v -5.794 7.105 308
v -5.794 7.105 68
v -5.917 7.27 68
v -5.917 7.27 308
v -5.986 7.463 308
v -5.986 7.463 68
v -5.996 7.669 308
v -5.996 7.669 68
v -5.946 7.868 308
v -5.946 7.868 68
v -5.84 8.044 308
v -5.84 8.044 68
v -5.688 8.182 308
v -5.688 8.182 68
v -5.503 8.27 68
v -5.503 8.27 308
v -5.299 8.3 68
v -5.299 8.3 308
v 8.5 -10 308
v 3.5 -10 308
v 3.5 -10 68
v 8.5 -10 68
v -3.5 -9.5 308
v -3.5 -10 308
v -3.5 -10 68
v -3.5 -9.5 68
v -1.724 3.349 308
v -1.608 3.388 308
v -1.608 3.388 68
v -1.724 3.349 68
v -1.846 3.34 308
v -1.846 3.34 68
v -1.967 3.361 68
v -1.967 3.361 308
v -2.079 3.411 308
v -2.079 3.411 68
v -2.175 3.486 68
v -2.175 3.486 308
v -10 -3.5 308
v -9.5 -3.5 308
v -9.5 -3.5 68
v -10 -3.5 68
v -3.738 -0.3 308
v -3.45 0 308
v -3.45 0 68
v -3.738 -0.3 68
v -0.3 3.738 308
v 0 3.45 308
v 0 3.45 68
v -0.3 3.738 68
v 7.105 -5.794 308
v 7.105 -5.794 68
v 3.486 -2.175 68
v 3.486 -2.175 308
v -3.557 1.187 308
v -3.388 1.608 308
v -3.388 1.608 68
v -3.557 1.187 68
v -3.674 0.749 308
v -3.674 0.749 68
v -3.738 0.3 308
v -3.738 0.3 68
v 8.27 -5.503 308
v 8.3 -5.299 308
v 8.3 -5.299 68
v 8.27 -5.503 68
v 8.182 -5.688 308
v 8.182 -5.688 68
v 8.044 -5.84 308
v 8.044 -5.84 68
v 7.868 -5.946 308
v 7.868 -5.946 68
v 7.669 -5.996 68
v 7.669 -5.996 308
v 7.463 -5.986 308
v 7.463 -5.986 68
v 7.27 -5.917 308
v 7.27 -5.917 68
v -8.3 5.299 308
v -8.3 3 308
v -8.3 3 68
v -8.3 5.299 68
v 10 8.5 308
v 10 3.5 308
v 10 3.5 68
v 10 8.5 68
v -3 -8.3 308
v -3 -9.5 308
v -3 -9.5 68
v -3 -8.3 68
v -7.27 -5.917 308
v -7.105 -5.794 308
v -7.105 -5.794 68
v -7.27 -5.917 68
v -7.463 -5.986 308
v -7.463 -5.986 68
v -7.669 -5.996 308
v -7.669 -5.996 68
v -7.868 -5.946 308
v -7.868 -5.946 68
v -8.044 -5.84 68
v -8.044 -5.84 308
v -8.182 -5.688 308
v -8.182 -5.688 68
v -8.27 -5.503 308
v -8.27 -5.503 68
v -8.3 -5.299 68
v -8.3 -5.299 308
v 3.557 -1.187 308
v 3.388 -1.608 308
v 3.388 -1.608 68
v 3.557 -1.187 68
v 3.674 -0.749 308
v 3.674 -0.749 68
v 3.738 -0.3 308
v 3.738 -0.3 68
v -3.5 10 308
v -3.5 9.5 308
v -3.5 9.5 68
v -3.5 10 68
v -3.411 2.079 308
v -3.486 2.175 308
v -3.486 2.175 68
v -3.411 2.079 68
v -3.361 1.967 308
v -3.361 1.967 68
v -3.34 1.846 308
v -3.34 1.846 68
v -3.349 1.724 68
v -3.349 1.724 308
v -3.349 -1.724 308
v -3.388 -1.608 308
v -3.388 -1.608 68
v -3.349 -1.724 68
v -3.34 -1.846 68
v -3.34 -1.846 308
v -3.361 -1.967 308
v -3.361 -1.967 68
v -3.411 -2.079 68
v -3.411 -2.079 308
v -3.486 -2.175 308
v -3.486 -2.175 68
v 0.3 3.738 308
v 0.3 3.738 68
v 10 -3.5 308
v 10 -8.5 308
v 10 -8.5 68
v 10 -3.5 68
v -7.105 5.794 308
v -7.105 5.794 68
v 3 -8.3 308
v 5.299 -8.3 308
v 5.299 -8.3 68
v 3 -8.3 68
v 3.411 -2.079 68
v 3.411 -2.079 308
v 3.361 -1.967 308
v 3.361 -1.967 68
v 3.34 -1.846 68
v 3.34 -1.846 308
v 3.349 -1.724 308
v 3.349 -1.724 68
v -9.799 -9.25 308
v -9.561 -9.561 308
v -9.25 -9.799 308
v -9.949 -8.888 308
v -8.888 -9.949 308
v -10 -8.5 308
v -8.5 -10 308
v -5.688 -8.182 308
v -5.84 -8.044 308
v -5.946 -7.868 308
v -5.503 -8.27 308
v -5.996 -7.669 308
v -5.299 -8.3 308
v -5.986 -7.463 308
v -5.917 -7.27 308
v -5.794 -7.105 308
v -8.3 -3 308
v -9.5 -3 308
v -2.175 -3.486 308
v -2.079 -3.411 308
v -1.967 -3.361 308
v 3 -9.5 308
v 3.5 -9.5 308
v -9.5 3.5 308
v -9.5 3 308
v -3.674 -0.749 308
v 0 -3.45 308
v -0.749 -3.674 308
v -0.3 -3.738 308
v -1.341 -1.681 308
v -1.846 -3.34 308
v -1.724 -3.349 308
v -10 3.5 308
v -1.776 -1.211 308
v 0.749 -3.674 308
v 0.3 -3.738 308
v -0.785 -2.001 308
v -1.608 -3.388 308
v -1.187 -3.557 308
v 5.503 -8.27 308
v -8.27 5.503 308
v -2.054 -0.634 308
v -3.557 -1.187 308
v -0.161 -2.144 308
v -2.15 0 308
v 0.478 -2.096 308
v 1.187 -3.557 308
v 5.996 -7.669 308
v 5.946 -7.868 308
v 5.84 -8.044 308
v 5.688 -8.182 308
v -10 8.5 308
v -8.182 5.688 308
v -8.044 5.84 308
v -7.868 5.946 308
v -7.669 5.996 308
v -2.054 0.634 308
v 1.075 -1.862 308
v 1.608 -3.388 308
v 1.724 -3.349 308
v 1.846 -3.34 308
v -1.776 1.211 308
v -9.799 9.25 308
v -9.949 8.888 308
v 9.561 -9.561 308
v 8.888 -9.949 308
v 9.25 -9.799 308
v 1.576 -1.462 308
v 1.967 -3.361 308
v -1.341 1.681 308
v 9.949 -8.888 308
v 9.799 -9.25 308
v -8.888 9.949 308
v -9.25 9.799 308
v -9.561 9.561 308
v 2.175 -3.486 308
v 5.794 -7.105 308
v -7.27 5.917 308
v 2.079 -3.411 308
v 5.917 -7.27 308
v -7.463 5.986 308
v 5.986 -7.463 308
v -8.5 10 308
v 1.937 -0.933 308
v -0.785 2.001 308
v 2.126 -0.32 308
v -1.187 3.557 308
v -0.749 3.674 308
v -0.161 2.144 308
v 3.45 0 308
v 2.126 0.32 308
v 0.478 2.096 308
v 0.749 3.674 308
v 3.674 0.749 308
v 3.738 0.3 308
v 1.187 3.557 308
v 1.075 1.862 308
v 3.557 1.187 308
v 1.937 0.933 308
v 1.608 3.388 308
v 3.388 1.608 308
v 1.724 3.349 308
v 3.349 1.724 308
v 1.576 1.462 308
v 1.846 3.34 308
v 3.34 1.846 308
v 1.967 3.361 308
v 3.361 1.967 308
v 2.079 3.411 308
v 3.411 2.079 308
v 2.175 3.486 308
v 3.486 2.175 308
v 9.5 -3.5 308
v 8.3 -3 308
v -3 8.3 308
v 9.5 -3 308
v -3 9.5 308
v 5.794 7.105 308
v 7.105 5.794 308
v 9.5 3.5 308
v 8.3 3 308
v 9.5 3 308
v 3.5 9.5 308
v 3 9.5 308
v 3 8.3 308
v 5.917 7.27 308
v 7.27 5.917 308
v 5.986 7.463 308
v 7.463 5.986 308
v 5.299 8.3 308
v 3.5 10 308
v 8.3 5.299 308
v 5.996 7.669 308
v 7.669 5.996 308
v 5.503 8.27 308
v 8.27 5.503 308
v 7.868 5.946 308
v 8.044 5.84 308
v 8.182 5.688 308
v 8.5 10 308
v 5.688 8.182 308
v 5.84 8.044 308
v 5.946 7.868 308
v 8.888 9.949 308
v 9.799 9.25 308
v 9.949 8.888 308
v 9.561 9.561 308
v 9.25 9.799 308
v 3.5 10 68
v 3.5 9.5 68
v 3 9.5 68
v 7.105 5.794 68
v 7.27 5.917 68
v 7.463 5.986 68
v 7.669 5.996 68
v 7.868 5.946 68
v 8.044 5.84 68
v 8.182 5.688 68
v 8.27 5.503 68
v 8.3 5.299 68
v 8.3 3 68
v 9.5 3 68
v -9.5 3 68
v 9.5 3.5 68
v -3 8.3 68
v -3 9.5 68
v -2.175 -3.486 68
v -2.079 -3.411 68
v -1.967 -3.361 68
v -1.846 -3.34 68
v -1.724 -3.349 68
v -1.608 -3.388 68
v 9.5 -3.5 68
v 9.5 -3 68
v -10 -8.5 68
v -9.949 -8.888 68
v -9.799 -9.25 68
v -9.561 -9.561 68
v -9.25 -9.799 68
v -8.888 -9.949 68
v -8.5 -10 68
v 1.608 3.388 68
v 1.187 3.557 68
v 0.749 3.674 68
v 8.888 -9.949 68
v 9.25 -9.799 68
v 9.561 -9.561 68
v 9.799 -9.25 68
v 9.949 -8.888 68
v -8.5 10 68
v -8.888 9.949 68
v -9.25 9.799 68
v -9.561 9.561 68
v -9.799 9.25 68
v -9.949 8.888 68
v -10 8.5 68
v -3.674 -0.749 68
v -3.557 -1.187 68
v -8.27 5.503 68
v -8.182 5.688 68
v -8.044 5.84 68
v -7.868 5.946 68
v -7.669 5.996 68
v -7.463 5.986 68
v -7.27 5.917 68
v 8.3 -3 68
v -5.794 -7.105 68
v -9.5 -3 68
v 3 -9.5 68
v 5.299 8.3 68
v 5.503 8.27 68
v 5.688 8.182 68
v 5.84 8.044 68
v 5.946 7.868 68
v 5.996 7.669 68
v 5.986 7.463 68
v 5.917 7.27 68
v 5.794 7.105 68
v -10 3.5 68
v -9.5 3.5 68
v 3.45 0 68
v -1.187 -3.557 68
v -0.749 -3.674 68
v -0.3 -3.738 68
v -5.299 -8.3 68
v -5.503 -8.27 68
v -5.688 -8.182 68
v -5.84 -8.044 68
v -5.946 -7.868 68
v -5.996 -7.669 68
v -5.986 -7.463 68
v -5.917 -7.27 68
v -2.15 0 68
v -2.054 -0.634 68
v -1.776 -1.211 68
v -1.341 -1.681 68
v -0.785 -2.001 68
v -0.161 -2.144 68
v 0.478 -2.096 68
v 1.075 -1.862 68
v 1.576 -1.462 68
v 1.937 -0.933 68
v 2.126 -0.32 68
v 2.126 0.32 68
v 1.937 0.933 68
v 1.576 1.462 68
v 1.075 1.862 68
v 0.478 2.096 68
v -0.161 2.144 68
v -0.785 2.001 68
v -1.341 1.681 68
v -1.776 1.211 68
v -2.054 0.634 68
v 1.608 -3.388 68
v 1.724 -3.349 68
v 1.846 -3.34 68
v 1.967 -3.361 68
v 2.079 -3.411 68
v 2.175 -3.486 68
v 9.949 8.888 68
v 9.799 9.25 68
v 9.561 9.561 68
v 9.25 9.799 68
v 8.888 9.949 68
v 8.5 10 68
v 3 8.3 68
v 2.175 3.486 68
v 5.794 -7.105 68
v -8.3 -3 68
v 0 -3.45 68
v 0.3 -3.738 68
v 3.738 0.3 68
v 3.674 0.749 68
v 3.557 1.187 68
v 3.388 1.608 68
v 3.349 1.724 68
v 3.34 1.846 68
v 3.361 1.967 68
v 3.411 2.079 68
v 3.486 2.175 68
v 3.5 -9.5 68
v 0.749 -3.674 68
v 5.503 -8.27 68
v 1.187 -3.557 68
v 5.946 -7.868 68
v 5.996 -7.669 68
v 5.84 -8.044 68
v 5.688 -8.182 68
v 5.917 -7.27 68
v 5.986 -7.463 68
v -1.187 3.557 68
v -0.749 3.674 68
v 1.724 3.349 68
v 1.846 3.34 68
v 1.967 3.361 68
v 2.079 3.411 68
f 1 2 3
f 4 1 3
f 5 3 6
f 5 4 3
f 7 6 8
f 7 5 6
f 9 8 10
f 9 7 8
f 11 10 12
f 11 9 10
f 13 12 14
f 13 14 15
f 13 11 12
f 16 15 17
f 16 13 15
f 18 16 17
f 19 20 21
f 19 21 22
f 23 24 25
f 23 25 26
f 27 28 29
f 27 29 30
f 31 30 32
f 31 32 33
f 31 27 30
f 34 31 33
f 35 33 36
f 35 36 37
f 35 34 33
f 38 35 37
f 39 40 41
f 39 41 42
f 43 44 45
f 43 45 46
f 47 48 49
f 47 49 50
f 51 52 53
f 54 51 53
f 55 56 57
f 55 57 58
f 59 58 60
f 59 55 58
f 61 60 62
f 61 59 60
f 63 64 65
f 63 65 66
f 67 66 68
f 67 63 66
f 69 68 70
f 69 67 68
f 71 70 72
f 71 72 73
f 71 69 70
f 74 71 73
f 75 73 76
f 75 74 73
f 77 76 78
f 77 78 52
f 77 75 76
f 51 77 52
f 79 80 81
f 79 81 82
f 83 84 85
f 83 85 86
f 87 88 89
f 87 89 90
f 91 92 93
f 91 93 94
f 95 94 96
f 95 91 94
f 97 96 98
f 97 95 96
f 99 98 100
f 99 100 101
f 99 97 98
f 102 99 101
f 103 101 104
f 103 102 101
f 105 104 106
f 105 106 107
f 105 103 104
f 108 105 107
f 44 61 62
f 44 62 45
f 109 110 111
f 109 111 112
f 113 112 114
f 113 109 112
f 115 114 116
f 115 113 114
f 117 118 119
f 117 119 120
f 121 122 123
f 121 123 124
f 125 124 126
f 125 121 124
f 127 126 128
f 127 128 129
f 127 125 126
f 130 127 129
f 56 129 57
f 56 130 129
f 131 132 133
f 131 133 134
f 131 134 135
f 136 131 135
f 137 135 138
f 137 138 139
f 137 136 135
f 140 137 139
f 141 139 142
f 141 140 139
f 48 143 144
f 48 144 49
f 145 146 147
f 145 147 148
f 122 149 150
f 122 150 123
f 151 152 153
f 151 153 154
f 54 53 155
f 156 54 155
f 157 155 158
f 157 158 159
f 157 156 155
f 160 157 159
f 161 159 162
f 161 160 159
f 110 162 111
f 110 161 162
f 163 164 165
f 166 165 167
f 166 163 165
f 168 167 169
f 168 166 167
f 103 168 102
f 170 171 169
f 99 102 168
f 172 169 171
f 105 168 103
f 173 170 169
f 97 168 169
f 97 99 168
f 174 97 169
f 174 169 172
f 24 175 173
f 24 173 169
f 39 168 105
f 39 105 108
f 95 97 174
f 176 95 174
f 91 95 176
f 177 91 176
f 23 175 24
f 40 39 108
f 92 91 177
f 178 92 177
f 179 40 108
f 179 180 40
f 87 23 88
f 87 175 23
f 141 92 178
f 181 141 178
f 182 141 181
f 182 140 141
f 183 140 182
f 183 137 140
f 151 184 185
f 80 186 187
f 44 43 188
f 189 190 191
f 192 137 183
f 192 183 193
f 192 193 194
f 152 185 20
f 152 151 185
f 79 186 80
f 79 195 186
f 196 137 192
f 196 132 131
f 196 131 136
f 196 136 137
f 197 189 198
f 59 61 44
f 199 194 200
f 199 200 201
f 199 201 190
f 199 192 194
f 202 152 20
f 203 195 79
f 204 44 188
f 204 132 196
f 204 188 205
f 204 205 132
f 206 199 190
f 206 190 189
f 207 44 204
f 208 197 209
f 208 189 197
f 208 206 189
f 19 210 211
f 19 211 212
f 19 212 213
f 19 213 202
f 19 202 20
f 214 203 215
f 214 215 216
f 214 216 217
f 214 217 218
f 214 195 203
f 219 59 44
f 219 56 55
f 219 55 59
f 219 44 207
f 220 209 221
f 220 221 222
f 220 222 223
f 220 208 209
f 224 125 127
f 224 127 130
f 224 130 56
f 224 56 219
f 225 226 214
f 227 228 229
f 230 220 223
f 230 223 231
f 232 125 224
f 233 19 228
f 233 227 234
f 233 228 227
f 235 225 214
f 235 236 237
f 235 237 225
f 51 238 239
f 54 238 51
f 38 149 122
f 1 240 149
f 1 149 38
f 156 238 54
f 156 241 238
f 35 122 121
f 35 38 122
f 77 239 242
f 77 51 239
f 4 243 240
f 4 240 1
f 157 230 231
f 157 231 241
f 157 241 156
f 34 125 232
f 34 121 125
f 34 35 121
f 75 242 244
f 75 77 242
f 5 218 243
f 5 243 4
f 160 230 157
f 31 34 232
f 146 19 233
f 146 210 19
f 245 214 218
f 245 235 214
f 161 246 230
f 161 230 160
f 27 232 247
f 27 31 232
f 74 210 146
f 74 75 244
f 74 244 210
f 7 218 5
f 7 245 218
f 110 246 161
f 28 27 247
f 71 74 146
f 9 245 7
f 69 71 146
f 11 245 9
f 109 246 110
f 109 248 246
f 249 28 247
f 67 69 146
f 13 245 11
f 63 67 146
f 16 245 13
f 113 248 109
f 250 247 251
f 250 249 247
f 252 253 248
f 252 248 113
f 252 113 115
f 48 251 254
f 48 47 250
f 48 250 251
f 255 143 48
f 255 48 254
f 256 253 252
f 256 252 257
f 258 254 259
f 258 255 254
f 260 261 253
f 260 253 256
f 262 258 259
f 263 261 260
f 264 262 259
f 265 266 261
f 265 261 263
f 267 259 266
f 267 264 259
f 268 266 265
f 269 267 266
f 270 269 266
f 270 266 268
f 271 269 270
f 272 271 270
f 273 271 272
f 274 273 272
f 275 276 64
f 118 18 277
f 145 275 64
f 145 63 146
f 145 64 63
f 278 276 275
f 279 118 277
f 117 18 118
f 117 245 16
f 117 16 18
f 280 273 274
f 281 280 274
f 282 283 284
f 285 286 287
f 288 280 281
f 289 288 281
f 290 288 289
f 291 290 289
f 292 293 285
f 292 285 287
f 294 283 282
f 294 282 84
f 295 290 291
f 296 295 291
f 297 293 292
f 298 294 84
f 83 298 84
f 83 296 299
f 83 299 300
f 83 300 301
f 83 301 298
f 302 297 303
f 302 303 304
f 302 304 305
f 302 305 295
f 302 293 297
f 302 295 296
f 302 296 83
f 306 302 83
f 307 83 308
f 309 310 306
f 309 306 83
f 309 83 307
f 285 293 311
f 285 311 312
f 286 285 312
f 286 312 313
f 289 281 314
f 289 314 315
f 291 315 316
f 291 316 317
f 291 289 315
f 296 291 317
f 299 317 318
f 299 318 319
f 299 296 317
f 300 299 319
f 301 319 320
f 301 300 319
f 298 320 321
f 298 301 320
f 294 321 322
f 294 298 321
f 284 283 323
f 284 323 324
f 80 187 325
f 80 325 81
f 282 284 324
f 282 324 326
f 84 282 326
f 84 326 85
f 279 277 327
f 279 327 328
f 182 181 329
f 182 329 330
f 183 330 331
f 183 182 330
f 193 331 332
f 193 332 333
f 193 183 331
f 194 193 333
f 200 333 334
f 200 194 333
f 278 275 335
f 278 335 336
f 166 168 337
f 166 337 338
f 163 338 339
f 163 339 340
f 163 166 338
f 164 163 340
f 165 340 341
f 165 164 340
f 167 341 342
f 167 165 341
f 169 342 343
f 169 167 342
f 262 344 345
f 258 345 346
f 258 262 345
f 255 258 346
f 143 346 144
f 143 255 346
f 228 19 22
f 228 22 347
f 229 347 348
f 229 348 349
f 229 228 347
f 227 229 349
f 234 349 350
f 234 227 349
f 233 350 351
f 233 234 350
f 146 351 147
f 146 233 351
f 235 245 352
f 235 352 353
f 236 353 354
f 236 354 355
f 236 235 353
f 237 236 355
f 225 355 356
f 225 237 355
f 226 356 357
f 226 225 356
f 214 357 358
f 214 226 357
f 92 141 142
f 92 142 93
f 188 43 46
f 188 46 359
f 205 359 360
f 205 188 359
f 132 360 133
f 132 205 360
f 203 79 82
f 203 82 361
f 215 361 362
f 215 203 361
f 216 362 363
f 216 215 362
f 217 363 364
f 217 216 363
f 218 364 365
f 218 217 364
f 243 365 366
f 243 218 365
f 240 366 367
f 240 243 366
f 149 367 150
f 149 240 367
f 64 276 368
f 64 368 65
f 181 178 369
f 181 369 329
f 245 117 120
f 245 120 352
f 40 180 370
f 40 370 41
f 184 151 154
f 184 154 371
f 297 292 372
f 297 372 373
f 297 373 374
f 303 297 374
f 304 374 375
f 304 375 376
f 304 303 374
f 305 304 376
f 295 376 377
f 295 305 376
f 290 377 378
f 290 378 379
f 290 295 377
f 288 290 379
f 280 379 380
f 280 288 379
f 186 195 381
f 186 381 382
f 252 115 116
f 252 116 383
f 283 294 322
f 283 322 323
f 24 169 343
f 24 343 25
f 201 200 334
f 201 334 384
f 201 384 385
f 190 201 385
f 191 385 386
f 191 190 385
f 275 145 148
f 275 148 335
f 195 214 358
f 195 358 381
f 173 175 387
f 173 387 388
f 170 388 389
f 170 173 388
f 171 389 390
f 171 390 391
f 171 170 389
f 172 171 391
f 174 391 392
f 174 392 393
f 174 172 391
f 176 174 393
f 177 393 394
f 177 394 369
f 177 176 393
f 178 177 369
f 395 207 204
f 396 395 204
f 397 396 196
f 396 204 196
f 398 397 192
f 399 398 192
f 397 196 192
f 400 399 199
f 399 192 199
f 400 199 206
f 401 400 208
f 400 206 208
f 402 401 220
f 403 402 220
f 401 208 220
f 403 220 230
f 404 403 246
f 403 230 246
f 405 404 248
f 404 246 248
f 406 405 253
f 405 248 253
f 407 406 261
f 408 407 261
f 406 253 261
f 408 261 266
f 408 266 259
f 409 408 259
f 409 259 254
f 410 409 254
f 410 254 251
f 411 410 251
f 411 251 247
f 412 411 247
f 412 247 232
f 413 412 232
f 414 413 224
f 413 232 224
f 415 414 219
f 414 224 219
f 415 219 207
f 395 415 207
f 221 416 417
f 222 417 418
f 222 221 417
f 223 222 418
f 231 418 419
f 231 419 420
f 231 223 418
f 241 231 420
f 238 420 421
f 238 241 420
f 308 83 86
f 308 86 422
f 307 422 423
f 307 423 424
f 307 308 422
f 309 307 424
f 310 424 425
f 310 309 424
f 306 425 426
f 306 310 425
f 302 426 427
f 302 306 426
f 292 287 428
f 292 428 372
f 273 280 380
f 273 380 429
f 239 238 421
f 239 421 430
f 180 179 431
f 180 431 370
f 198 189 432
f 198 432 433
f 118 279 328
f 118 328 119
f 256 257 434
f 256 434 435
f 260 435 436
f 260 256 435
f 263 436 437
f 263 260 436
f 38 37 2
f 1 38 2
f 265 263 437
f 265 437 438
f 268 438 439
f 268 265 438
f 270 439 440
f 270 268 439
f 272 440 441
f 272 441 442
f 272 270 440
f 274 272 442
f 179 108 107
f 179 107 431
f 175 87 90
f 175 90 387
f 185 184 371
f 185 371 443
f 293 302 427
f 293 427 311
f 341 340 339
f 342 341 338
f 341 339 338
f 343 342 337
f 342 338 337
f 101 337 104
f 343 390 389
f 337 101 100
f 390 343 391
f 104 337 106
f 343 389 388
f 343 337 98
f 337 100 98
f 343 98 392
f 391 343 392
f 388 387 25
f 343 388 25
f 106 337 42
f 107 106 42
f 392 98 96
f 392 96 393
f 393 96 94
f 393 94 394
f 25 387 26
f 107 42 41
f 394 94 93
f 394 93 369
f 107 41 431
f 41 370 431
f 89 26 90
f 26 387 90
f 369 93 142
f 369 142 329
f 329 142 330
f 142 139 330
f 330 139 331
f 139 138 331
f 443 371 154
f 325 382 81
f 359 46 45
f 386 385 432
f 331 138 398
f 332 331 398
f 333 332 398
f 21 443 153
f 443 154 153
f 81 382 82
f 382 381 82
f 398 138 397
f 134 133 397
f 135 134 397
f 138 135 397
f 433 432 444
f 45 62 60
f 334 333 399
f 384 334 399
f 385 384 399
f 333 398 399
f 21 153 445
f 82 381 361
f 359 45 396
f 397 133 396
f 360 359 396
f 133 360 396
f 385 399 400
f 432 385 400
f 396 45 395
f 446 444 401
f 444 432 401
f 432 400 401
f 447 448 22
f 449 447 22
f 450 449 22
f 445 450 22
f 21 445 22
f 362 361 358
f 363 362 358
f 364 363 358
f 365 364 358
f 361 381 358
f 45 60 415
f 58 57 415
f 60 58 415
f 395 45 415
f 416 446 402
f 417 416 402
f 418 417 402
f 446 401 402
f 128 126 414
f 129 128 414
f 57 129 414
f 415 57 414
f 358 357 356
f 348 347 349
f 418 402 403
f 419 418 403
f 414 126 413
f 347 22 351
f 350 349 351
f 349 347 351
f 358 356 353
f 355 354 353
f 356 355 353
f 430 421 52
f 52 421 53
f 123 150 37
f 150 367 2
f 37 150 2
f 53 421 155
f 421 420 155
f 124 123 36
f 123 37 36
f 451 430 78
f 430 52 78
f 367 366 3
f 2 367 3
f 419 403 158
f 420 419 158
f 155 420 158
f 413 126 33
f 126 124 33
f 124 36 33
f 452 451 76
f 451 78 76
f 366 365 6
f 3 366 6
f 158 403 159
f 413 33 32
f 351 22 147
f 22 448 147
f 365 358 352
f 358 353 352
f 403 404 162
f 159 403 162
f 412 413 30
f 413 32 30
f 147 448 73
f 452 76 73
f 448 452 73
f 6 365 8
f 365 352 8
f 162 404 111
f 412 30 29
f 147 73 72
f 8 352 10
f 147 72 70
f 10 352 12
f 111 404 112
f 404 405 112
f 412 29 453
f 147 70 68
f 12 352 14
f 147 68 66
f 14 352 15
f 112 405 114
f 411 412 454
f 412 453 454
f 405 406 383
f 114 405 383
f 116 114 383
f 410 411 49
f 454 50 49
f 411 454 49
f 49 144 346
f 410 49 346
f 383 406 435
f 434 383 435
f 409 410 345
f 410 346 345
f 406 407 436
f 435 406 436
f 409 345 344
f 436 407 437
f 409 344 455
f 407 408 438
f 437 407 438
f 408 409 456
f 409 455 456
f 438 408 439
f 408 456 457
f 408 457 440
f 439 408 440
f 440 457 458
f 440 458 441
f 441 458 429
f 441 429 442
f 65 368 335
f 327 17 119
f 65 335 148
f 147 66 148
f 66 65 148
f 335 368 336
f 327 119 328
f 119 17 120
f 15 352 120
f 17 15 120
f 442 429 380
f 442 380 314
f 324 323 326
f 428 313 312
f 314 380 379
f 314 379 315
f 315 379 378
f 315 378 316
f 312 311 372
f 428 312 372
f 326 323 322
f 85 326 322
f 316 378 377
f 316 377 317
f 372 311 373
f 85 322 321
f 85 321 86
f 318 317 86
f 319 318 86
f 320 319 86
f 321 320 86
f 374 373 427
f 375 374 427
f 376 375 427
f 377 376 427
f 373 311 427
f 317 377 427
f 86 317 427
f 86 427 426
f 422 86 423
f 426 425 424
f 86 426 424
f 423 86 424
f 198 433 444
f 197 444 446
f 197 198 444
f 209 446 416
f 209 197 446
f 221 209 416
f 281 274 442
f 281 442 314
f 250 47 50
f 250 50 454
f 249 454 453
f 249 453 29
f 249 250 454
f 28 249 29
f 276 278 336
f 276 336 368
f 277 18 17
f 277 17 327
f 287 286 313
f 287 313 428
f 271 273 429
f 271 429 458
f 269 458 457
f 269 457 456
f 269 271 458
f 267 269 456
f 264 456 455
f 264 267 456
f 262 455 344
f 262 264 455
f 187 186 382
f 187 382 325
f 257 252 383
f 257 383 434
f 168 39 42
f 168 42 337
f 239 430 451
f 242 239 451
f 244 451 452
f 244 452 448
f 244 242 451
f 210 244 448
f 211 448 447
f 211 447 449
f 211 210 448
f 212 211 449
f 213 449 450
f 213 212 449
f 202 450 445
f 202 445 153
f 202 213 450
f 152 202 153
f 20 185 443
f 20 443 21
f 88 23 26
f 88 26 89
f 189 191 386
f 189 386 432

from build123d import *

# Parameters (mm, degrees)
SKETCH1_R           = 2.15
BOSS_EXTRUDE1_DEPTH = 240


# Read off the part's stored shape, not the designer's step: moBlkMgr[nhom 20x20x200]
with BuildPart() as part:
    # Sketch1 → Boss-Extrude1 (new body)
    with BuildSketch(Plane.XY.offset(308)):
        with BuildLine():
            Line((-3.499999948, -10), (-3.499999948, -9.5))
            Line((-3.499999948, -9.5), (-2.999999948, -9.5))
            Line((-2.999999948, -9.5), (-2.999999948, -8.299999968))
            Line((-2.999999948, -8.299999968), (-5.299390251, -8.299999968))
            ThreePointArc((-5.299390251, -8.299999968), (-5.946105923, -7.867878372), (-5.794365, -7.105025224))
            Line((-5.794365, -7.105025224), (-2.175465548, -3.48612574))
            ThreePointArc((-2.175465548, -3.48612574), (-1.907085057, -3.346986956), (-1.607569547, -3.387952169))
            ThreePointArc((-1.607569547, -3.387952169), (-0.96970891, -3.622452814), (-0.299999981, -3.73798071))
            Line((-0.299999981, -3.73798071), (1.9e-08, -3.449999972))
            Line((1.9e-08, -3.449999972), (0.300000019, -3.737980711))
            ThreePointArc((0.300000019, -3.737980711), (0.969708957, -3.622452812), (1.607569601, -3.387952162))
            ThreePointArc((1.607569601, -3.387952162), (1.90708511, -3.346986948), (2.175465602, -3.48612573))
            Line((2.175465602, -3.48612573), (5.794365085, -7.105025213))
            ThreePointArc((5.794365085, -7.105025213), (5.946106012, -7.867878368), (5.299390335, -8.299999968))
            Line((5.299390335, -8.299999968), (2.999999948, -8.299999968))
            Line((2.999999948, -8.299999968), (2.999999948, -9.5))
            Line((2.999999948, -9.5), (3.499999948, -9.5))
            Line((3.499999948, -9.5), (3.499999948, -10))
            Line((3.499999948, -10), (8.499999948, -10))
            ThreePointArc((8.499999948, -10), (9.56066012, -9.560660172), (9.999999948, -8.5))
            Line((9.999999948, -8.5), (9.999999948, -3.5))
            Line((9.999999948, -3.5), (9.499999948, -3.5))
            Line((9.499999948, -3.5), (9.499999948, -3))
            Line((9.499999948, -3), (8.299999976, -3))
            Line((8.299999976, -3), (8.299999976, -5.299390317))
            ThreePointArc((8.299999976, -5.299390317), (7.867878377, -5.94610599), (7.105025227, -5.794365061))
            Line((7.105025227, -5.794365061), (3.486125768, -2.17546557))
            ThreePointArc((3.486125768, -2.17546557), (3.346986986, -1.907085078), (3.387952202, -1.607569568))
            ThreePointArc((3.387952202, -1.607569568), (3.622452857, -0.969708918), (3.737980757, -0.299999973))
            Line((3.737980757, -0.299999973), (3.450000019, 2.8e-08))
            Line((3.450000019, 2.8e-08), (3.737980758, 0.300000028))
            ThreePointArc((3.737980758, 0.300000028), (3.622452857, 0.969708973), (3.387952202, 1.607569624))
            ThreePointArc((3.387952202, 1.607569624), (3.346986986, 1.907085133), (3.486125768, 2.175465626))
            Line((3.486125768, 2.175465626), (7.105025228, 5.794365118))
            ThreePointArc((7.105025228, 5.794365118), (7.867878378, 5.946106047), (8.299999976, 5.299390374))
            Line((8.299999976, 5.299390374), (8.299999976, 3))
            Line((8.299999976, 3), (9.499999948, 3))
            Line((9.499999948, 3), (9.499999948, 3.5))
            Line((9.499999948, 3.5), (9.999999948, 3.5))
            Line((9.999999948, 3.5), (9.999999948, 8.5))
            ThreePointArc((9.999999948, 8.5), (9.56066012, 9.560660172), (8.499999948, 10))
            Line((8.499999948, 10), (3.499999948, 10))
            Line((3.499999948, 10), (3.499999948, 9.5))
            Line((3.499999948, 9.5), (2.999999948, 9.5))
            Line((2.999999948, 9.5), (2.999999948, 8.300000024))
            Line((2.999999948, 8.300000024), (5.299390295, 8.300000024))
            ThreePointArc((5.299390295, 8.300000024), (5.946105965, 7.86787843), (5.794365042, 7.105025283))
            Line((5.794365042, 7.105025283), (2.175465586, 3.486125796))
            ThreePointArc((2.175465586, 3.486125796), (1.907085095, 3.346987012), (1.607569585, 3.387952225))
            ThreePointArc((1.607569585, 3.387952225), (0.969708948, 3.62245287), (0.300000018, 3.737980766))
            Line((0.300000018, 3.737980766), (1.9e-08, 3.450000028))
            Line((1.9e-08, 3.450000028), (-0.299999982, 3.737980766))
            ThreePointArc((-0.299999982, 3.737980766), (-0.969708911, 3.62245287), (-1.607569547, 3.387952225))
            ThreePointArc((-1.607569547, 3.387952225), (-1.907085057, 3.346987012), (-2.175465548, 3.486125796))
            Line((-2.175465548, 3.486125796), (-5.794365, 7.105025279))
            ThreePointArc((-5.794365, 7.105025279), (-5.946105923, 7.867878428), (-5.299390251, 8.300000024))
            Line((-5.299390251, 8.300000024), (-2.999999948, 8.300000024))
            Line((-2.999999948, 8.300000024), (-2.999999948, 9.5))
            Line((-2.999999948, 9.5), (-3.499999948, 9.5))
            Line((-3.499999948, 9.5), (-3.499999948, 10))
            Line((-3.499999948, 10), (-8.499999948, 10))
            ThreePointArc((-8.499999948, 10), (-9.56066012, 9.560660172), (-9.999999948, 8.5))
            Line((-9.999999948, 8.5), (-9.999999948, 3.5))
            Line((-9.999999948, 3.5), (-9.499999948, 3.5))
            Line((-9.499999948, 3.5), (-9.499999948, 3))
            Line((-9.499999948, 3), (-8.299999938, 3))
            Line((-8.299999938, 3), (-8.299999938, 5.299390329))
            ThreePointArc((-8.299999938, 5.299390329), (-7.867878344, 5.946105997), (-7.1050252, 5.794365072))
            Line((-7.1050252, 5.794365072), (-3.486125739, 2.175465611))
            ThreePointArc((-3.486125739, 2.175465611), (-3.346986957, 1.907085119), (-3.387952171, 1.607569609))
            ThreePointArc((-3.387952171, 1.607569609), (-3.622452821, 0.969708966), (-3.737980719, 0.300000029))
            Line((-3.737980719, 0.300000029), (-3.449999981, 2.8e-08))
            Line((-3.449999981, 2.8e-08), (-3.737980719, -0.299999971))
            ThreePointArc((-3.737980719, -0.299999971), (-3.622452819, -0.969708917), (-3.387952164, -1.607569568))
            ThreePointArc((-3.387952164, -1.607569568), (-3.346986948, -1.907085078), (-3.486125729, -2.17546557))
            Line((-3.486125729, -2.17546557), (-7.105025189, -5.794365061))
            ThreePointArc((-7.105025189, -5.794365061), (-7.867878339, -5.94610599), (-8.299999938, -5.299390317))
            Line((-8.299999938, -5.299390317), (-8.299999938, -3))
            Line((-8.299999938, -3), (-9.499999948, -3))
            Line((-9.499999948, -3), (-9.499999948, -3.5))
            Line((-9.499999948, -3.5), (-9.999999948, -3.5))
            Line((-9.999999948, -3.5), (-9.999999948, -8.5))
            ThreePointArc((-9.999999948, -8.5), (-9.56066012, -9.560660172), (-8.499999948, -10))
            Line((-8.499999948, -10), (-3.499999948, -10))
        make_face()
        with Locations(Location((1.9e-08, 2.8e-08, 0), (0, 0, 180))):
            Circle(SKETCH1_R, mode=Mode.SUBTRACT)
    extrude(amount=-BOSS_EXTRUDE1_DEPTH)


solid = part.part
